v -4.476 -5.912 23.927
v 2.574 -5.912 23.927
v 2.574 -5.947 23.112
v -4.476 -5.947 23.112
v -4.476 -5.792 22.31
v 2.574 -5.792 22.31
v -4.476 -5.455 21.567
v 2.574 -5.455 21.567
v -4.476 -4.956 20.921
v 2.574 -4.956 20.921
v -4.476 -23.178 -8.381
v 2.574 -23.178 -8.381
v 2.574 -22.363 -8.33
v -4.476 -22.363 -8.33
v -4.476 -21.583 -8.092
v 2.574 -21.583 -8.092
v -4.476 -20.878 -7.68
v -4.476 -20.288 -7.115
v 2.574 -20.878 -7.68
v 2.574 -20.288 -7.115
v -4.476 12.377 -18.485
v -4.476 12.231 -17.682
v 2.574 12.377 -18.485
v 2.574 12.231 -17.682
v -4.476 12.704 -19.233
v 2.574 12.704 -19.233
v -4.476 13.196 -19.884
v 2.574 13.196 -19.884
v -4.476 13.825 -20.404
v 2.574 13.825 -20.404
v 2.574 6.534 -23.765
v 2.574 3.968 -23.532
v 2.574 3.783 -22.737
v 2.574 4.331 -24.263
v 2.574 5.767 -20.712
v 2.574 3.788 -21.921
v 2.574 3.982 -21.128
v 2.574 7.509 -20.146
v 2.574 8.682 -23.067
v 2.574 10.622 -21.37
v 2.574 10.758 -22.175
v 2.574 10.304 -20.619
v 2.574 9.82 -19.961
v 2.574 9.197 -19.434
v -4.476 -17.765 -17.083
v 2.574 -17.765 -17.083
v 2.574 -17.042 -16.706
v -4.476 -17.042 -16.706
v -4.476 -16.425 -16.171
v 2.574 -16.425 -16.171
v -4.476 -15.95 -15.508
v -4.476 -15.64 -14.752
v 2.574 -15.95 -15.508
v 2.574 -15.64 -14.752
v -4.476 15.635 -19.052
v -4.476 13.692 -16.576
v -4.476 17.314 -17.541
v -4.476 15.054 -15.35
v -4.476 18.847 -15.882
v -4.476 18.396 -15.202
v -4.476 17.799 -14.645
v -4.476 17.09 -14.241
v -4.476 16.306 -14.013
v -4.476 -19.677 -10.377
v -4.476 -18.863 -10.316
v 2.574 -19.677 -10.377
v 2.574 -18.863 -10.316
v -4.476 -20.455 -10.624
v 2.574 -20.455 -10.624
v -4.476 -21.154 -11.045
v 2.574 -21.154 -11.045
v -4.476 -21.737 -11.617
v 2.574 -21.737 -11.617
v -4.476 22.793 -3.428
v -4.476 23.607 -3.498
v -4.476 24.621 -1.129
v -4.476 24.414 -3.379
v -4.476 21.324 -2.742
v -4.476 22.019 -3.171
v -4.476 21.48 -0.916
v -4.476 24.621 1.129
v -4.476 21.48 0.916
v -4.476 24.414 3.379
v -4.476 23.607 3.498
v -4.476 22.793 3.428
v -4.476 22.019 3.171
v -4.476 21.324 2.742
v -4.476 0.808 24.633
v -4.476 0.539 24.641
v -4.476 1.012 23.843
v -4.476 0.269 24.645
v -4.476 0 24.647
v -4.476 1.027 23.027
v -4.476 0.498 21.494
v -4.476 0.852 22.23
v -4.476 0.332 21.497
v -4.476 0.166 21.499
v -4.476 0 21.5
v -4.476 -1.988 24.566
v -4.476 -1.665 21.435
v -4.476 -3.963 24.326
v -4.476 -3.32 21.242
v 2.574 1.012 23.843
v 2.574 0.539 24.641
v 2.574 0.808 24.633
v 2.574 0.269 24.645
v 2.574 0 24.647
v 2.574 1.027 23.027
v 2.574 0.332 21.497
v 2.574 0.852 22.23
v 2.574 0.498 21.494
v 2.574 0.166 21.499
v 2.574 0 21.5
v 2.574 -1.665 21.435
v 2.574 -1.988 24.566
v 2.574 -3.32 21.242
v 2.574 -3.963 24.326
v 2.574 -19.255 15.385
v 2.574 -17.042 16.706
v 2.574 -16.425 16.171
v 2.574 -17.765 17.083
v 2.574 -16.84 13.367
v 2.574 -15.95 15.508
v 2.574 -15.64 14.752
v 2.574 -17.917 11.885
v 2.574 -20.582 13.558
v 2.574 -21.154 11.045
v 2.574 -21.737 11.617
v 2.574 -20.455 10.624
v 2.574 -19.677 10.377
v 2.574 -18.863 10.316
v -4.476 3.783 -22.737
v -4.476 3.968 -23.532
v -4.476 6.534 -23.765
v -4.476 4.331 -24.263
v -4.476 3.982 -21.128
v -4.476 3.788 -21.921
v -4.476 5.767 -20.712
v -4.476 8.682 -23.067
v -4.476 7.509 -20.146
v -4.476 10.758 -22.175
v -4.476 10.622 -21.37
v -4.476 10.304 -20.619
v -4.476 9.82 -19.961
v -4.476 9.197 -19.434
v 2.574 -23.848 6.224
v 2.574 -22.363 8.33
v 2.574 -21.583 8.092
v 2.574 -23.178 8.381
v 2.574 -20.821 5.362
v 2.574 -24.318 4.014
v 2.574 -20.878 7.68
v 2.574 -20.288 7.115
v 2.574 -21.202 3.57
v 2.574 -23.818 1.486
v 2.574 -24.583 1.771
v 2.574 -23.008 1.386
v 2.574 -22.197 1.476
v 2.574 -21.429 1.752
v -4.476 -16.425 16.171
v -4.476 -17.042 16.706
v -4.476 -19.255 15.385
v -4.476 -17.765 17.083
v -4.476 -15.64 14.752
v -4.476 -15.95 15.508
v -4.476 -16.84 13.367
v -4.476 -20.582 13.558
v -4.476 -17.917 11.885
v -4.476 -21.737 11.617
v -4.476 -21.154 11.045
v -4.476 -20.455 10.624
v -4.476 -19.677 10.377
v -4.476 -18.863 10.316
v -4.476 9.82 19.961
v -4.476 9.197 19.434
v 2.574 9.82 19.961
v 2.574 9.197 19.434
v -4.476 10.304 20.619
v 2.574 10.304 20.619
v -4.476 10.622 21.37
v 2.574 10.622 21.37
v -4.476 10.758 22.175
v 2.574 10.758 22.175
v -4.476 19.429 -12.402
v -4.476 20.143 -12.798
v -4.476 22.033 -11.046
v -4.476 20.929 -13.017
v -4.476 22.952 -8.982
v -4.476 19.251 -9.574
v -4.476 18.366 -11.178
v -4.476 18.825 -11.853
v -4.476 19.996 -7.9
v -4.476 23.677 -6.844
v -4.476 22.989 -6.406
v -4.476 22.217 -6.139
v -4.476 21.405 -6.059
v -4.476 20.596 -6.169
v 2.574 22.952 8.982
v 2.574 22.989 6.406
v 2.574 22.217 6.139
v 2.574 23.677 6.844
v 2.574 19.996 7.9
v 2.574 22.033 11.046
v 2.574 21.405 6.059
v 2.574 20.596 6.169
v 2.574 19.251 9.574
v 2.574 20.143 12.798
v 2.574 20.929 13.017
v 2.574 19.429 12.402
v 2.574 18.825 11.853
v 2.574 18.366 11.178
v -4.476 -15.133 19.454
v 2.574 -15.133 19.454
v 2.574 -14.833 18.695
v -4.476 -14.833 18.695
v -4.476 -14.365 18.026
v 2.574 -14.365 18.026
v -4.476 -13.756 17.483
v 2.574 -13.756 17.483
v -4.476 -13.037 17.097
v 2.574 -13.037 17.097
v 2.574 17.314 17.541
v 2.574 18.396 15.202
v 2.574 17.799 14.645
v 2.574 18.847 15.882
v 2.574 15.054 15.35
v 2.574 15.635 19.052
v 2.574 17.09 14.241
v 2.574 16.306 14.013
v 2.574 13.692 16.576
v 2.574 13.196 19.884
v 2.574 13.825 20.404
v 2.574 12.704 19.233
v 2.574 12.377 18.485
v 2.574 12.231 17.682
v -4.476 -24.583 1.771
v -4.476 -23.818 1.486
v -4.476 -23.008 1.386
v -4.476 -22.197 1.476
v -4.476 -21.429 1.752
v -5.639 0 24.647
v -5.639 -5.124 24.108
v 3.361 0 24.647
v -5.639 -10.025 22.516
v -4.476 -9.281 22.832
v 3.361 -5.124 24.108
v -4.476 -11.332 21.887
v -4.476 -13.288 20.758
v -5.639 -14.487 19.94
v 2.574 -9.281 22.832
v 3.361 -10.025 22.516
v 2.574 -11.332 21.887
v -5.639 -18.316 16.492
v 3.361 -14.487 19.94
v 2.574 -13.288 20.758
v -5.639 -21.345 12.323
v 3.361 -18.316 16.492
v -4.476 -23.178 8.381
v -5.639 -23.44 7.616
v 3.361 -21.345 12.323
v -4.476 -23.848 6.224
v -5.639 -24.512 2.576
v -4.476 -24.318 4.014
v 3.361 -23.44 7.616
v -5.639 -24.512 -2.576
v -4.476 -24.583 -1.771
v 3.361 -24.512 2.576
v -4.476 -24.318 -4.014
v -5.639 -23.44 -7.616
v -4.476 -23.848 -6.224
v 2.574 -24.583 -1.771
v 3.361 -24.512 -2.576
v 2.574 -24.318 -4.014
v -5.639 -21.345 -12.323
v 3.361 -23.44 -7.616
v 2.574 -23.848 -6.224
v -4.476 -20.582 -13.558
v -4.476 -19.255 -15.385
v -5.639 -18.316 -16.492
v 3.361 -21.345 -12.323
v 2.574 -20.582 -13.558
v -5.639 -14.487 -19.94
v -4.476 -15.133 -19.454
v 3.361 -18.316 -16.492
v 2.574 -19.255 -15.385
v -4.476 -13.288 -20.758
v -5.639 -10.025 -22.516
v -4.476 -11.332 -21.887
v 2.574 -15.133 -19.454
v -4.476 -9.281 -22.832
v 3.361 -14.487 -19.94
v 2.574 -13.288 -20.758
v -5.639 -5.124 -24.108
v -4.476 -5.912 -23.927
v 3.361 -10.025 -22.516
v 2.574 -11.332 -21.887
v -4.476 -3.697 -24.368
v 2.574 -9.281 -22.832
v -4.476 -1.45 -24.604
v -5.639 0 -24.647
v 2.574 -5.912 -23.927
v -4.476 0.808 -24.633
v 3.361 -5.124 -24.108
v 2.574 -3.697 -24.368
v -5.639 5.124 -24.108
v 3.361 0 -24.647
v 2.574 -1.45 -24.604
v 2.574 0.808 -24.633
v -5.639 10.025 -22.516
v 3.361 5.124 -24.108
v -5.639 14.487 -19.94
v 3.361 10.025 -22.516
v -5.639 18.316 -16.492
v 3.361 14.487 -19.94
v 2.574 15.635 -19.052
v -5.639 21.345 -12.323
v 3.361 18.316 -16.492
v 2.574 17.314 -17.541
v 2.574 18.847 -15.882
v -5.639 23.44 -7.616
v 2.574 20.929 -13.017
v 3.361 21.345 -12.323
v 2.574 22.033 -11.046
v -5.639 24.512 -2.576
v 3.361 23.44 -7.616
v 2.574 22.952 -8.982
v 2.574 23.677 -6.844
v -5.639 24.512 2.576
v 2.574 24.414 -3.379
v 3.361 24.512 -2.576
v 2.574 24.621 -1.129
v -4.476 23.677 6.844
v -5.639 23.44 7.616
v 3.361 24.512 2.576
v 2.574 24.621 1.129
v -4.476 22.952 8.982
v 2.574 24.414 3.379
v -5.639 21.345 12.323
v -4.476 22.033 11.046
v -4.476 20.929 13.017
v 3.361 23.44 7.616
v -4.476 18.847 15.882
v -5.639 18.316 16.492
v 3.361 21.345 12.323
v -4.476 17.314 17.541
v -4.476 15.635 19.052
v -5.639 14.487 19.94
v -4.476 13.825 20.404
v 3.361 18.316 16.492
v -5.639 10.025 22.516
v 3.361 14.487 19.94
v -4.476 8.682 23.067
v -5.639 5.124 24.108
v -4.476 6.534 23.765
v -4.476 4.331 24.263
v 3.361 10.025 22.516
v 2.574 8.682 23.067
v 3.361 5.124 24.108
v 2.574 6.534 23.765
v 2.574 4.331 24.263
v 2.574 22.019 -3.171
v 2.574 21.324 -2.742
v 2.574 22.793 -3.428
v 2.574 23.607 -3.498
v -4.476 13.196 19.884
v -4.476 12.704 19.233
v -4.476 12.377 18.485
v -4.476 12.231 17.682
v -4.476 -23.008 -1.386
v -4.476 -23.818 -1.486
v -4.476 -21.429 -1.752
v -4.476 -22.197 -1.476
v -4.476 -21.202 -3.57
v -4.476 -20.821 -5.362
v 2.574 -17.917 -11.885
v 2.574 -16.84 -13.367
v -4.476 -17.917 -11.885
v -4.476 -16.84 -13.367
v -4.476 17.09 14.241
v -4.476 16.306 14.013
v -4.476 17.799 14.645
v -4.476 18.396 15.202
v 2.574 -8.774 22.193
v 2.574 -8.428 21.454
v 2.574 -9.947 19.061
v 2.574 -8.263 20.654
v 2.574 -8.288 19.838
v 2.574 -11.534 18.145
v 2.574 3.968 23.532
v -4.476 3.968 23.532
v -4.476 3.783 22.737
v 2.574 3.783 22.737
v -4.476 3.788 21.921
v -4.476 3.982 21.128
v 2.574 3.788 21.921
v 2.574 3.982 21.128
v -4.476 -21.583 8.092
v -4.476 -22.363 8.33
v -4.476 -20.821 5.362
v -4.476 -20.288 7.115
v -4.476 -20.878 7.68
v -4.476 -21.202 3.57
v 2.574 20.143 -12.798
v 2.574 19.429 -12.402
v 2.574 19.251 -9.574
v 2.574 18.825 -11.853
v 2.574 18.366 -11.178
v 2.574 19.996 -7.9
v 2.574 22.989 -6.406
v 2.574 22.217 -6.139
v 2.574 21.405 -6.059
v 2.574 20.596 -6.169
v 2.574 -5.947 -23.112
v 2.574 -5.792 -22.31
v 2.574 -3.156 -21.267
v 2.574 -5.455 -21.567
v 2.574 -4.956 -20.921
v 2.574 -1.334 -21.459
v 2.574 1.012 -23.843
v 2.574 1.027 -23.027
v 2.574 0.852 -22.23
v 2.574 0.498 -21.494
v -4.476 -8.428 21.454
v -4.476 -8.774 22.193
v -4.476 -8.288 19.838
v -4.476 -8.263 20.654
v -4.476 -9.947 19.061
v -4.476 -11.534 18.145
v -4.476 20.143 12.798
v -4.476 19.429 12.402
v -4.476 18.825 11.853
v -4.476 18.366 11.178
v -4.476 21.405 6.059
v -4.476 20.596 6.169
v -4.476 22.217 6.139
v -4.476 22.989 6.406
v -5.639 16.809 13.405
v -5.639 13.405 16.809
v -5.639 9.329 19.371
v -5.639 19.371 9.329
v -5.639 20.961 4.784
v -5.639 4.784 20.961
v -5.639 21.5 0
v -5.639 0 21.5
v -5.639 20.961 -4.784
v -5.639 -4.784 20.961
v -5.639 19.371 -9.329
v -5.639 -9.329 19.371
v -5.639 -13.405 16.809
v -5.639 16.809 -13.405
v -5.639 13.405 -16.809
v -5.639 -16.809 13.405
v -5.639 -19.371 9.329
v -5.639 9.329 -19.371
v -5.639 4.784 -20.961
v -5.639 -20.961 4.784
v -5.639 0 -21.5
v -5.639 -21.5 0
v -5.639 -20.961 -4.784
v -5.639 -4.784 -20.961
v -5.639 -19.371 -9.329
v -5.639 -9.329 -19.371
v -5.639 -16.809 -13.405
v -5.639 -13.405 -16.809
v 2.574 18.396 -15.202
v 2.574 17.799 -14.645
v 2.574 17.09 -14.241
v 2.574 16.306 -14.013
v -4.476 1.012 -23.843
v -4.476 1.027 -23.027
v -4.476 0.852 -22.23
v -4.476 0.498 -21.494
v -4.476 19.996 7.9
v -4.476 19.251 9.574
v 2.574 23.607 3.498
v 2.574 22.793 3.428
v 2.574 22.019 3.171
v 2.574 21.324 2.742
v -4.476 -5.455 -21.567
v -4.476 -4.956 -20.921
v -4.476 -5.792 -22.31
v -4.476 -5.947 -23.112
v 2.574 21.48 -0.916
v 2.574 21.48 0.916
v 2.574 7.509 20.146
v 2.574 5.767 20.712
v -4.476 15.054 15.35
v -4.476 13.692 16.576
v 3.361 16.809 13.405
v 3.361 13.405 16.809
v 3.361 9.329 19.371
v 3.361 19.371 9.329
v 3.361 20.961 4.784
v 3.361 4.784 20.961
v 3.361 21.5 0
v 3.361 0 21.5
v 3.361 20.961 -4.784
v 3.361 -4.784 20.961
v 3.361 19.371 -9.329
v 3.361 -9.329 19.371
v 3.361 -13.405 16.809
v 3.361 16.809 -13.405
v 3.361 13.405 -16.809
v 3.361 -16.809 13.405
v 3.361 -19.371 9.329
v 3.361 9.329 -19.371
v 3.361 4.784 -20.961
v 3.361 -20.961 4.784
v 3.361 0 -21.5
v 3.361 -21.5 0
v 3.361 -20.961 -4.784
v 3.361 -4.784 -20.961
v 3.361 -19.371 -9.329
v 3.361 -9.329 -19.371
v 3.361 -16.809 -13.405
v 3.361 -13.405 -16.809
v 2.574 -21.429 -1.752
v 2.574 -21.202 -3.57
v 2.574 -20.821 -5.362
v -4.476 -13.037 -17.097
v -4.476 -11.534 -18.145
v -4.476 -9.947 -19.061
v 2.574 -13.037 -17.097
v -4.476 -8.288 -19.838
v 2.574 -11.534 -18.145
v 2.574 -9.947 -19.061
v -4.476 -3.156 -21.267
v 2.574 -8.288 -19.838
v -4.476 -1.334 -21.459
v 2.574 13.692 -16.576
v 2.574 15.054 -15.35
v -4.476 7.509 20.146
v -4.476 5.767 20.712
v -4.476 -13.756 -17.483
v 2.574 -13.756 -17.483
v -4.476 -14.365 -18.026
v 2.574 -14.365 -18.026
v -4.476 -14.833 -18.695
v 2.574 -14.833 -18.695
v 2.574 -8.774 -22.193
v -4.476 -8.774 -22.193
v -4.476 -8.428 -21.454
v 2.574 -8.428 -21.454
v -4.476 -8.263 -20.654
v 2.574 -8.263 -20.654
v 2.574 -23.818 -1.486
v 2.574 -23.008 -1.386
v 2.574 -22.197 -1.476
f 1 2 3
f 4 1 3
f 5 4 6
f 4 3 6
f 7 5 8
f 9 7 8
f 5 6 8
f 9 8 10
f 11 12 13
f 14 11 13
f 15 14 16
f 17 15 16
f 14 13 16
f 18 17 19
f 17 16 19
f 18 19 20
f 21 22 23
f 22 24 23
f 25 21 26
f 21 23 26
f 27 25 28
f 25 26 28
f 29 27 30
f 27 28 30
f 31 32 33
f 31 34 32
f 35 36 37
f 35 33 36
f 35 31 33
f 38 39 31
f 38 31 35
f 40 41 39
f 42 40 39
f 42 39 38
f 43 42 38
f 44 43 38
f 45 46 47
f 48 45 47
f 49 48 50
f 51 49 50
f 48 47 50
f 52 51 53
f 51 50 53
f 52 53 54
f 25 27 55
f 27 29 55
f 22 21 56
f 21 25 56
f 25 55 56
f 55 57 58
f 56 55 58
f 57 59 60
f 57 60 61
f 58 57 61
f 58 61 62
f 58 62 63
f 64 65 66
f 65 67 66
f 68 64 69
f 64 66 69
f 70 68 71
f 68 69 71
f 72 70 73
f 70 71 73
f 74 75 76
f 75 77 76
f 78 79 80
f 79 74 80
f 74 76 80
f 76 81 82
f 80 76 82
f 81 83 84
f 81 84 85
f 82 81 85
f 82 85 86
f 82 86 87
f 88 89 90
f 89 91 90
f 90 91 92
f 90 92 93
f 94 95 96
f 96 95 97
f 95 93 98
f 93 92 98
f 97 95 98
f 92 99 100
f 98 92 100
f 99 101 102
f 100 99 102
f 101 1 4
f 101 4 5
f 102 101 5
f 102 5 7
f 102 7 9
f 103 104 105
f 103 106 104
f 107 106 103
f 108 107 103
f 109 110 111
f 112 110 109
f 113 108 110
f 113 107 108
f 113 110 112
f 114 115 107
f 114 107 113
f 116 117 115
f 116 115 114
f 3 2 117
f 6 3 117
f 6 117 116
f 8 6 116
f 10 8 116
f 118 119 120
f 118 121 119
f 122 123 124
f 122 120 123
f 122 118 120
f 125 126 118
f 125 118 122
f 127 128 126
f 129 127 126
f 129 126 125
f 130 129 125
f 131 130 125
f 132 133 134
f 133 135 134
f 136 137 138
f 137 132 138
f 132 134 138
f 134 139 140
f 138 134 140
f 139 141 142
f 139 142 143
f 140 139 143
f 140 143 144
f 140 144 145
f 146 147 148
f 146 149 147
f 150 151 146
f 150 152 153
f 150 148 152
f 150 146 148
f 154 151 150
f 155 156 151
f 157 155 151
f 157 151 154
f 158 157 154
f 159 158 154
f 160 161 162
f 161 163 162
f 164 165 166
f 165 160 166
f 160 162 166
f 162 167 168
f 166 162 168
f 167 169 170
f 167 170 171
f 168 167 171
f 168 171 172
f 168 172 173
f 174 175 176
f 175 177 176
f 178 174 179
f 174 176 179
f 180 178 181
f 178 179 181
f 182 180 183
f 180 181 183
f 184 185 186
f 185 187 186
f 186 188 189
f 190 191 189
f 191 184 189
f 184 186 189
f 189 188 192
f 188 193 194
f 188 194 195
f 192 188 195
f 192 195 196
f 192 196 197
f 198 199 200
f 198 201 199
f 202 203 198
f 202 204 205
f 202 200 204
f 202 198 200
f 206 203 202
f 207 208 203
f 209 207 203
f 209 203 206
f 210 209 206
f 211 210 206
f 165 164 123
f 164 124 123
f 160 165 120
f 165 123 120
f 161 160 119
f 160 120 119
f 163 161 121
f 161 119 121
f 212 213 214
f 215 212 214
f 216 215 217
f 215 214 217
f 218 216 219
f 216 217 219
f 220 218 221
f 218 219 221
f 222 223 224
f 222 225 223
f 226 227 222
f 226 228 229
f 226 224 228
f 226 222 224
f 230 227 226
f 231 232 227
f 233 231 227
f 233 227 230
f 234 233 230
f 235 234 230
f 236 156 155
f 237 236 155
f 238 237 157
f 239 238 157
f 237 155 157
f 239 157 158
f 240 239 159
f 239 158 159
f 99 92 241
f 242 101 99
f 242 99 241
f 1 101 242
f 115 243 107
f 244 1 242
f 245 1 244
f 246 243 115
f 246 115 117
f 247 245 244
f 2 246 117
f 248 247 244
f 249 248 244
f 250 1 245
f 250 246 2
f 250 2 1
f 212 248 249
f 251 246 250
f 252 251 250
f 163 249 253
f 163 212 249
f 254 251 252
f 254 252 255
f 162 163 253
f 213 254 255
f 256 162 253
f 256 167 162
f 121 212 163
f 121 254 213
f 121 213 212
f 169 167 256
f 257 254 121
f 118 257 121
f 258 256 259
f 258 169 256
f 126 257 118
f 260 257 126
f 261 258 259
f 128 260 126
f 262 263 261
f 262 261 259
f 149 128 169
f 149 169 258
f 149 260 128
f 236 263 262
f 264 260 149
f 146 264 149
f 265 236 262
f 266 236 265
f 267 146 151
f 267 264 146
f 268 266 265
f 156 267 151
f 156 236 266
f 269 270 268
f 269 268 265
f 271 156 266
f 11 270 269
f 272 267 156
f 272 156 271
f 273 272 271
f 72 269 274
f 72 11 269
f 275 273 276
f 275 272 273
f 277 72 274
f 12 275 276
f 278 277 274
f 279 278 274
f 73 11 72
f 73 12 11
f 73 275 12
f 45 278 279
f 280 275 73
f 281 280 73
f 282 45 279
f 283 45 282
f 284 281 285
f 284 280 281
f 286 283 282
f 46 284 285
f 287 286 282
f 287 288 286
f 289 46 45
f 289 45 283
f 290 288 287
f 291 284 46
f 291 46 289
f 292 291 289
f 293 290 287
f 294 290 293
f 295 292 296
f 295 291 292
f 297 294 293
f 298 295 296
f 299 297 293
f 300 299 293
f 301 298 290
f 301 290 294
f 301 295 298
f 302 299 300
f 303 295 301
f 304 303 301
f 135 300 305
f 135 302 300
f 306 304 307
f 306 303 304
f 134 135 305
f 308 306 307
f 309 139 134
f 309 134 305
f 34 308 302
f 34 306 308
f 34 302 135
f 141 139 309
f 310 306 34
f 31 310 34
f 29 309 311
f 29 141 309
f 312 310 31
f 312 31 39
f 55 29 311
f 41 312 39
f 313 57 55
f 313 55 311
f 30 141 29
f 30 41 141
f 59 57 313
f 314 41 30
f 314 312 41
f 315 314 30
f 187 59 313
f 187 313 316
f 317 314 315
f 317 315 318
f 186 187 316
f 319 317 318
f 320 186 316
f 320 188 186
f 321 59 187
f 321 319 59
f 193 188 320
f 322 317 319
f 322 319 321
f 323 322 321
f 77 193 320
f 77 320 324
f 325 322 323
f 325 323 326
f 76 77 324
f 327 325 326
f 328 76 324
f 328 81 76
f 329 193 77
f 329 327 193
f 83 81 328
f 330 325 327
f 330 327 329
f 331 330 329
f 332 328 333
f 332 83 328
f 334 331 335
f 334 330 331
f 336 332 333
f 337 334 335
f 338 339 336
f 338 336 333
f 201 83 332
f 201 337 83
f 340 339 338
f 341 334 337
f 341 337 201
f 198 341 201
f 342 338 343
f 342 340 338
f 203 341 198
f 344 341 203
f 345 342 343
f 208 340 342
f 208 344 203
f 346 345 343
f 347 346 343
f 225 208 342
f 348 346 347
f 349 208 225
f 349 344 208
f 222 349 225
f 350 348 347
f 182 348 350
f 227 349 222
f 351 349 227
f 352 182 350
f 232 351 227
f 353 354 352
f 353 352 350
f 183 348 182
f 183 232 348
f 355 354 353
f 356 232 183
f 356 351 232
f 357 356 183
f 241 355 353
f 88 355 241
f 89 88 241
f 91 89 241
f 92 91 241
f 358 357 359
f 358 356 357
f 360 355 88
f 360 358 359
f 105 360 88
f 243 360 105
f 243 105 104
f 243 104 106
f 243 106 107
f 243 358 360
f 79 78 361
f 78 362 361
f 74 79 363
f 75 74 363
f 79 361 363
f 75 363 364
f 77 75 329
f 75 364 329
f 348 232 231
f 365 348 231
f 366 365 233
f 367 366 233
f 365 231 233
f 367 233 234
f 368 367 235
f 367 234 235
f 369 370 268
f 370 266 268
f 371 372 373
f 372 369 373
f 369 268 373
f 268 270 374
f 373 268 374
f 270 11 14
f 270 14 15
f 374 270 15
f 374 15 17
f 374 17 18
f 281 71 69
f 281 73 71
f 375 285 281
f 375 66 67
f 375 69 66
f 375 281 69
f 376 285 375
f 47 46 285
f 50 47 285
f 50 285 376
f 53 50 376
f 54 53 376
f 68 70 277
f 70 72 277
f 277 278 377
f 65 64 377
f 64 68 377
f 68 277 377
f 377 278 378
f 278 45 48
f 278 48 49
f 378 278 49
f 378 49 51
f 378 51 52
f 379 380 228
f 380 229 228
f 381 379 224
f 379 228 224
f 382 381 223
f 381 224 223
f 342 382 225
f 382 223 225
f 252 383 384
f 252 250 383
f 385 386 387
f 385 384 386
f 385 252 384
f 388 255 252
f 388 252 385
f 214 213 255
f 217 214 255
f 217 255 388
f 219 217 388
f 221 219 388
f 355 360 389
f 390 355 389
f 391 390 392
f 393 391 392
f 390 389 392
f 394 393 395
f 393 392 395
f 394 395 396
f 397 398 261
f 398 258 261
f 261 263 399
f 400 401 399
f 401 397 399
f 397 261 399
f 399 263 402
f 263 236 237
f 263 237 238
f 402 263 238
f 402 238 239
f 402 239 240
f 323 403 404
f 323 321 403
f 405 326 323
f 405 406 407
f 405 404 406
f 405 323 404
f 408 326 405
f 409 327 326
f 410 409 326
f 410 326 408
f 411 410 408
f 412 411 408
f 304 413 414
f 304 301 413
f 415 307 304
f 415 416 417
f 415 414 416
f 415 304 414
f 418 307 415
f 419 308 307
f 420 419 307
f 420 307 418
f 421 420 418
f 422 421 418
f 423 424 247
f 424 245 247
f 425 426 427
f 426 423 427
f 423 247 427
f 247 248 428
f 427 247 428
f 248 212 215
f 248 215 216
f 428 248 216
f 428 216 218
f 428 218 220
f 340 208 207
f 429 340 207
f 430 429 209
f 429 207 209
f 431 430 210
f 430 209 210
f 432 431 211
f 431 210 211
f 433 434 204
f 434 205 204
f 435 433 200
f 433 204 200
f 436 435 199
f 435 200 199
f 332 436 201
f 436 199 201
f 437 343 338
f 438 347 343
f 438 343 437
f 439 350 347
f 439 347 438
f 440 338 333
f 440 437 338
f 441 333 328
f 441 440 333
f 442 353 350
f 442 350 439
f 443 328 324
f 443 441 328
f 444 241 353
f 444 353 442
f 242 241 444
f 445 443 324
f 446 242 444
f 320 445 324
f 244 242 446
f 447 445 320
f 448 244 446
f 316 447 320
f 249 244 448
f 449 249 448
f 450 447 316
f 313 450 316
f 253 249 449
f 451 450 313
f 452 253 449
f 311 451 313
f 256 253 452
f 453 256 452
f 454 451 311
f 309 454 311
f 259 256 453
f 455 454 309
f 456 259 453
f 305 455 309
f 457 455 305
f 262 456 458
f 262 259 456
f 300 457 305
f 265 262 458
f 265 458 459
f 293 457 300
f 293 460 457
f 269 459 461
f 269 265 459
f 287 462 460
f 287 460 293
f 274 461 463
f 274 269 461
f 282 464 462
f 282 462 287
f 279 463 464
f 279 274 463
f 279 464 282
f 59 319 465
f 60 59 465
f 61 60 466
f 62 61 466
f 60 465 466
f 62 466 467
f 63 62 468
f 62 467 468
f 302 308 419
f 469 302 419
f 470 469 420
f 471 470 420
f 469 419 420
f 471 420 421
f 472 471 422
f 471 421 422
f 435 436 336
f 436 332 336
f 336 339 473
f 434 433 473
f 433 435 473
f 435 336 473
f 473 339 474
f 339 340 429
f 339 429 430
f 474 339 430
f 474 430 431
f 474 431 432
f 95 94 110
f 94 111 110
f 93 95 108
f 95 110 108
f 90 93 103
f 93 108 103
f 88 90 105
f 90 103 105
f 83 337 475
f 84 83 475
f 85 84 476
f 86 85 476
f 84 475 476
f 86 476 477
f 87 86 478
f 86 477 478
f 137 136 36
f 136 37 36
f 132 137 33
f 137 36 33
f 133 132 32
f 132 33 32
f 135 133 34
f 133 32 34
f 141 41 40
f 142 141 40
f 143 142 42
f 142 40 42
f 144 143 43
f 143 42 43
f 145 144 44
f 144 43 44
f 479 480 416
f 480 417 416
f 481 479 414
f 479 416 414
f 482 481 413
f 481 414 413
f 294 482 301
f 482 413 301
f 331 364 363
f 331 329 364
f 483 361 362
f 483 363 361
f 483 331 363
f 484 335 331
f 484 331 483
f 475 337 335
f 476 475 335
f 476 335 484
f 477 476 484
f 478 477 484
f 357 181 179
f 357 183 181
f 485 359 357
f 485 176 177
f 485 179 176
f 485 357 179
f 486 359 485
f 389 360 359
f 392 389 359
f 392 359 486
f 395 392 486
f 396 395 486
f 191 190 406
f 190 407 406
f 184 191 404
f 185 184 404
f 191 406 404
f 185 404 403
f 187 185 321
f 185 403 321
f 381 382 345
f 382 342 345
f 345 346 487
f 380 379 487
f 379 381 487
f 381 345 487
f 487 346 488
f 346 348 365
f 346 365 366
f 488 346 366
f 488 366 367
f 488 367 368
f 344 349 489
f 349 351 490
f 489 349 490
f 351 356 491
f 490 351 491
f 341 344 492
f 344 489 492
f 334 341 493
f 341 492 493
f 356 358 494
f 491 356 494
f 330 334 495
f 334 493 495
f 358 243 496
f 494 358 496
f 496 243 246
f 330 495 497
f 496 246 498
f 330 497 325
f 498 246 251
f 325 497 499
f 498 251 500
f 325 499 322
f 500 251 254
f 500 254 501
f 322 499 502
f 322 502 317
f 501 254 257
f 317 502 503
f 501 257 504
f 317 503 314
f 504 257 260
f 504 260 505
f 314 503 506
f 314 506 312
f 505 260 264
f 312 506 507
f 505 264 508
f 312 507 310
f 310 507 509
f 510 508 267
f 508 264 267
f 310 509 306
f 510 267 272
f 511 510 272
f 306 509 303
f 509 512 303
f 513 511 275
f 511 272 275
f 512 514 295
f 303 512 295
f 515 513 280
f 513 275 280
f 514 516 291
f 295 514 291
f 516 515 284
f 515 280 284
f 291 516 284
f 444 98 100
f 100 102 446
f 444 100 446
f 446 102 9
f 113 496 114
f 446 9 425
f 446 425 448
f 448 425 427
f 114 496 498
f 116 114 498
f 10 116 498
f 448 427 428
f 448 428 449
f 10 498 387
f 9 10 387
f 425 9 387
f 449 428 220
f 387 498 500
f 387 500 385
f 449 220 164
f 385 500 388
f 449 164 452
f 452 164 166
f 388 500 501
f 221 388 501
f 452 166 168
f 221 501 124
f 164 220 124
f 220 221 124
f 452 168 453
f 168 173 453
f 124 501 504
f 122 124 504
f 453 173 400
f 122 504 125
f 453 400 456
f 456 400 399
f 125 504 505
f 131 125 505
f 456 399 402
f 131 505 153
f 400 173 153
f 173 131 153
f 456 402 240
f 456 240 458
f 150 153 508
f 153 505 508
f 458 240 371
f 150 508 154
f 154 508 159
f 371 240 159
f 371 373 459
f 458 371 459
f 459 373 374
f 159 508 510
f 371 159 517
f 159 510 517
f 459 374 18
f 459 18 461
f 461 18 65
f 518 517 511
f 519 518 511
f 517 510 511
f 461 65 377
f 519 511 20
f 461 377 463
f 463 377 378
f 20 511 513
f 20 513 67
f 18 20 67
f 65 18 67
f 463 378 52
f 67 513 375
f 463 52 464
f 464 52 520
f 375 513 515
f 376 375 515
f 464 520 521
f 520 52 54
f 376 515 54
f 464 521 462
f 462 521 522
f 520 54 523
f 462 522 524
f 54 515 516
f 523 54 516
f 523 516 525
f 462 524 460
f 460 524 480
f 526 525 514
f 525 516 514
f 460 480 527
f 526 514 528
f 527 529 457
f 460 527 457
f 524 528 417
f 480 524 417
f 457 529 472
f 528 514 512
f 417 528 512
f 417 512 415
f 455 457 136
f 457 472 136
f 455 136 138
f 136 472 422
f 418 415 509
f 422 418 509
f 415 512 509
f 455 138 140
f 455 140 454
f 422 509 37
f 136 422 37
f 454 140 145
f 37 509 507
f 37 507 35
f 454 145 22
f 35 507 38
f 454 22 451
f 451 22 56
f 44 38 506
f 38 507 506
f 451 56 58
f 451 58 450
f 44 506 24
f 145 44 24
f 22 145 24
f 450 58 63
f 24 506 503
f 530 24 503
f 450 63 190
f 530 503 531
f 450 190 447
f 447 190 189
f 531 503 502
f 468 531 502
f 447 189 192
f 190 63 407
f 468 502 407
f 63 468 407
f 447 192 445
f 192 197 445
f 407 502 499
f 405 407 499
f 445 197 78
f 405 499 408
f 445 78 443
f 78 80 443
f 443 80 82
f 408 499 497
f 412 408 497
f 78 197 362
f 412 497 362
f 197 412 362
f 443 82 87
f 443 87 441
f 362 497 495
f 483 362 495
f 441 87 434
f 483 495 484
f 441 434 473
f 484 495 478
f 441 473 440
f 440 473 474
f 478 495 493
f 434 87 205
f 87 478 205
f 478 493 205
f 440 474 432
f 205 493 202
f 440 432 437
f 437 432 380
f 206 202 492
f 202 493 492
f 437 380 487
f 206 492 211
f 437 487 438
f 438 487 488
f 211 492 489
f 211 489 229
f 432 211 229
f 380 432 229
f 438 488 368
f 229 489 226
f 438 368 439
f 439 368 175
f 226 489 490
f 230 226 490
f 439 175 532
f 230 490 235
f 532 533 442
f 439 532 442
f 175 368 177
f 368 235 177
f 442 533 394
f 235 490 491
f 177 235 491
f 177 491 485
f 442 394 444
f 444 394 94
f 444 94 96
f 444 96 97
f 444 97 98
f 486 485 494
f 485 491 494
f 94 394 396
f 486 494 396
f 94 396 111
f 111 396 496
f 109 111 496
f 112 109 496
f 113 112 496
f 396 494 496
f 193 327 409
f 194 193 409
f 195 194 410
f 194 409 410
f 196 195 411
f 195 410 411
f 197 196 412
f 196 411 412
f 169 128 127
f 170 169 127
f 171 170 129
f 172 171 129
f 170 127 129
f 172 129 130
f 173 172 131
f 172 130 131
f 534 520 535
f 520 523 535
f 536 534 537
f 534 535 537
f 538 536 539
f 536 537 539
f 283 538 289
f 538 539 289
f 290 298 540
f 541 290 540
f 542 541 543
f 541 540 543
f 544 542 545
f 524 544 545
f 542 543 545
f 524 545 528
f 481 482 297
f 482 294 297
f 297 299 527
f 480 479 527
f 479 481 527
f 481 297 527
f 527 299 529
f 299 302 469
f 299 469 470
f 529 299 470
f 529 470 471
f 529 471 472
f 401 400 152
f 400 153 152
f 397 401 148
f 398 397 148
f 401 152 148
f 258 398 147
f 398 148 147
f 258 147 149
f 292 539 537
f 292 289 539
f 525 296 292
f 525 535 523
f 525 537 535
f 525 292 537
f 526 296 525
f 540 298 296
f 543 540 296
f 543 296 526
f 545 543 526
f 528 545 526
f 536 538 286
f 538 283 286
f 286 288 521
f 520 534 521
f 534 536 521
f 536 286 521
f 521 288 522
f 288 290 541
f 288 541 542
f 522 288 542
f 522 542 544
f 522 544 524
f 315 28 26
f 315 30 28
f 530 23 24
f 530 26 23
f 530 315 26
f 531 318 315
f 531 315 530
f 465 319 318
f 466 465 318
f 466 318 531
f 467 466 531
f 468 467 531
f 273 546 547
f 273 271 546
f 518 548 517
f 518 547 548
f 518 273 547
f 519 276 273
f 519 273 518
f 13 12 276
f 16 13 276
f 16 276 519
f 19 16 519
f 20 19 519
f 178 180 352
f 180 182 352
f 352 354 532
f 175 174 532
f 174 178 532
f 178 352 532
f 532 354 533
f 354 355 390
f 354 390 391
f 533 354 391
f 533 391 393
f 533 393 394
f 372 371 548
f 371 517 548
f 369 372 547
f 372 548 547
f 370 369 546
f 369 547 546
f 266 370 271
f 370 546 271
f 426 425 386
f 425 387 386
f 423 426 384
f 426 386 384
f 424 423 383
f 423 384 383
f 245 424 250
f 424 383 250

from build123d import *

# Parameters (mm, degrees)
ESQUISSE1_W                  = 9
ESQUISSE1_H                  = 3.146636507
ESQUISSE2_W                  = 7.05
ESQUISSE2_H                  = 3.5
R_P_TITION_CIRCULAIRE1_COUNT = 15


with BuildPart() as part:
    # Esquisse1 → Base-Révolution (revolve)
    with BuildSketch(Plane.XY, mode=Mode.PRIVATE) as base_r_volution_sk:
        with Locations((-1.139387669, 23.073318253)):
            Rectangle(ESQUISSE1_W, ESQUISSE1_H)
    revolve(base_r_volution_sk.sketch.rotate(Axis((-8.771095324, 0, 0), (1, 0, 0)), 90), axis=Axis((-8.771095324, 0, 0), (1, 0, 0)))

    # Esquisse2 → Enlèvement de matière-Révolution1 (revolve, cut)
    with BuildSketch(Plane.XY):
        with Locations((-0.951181968, 25.25)):
            Rectangle(ESQUISSE2_W, ESQUISSE2_H)
    enl_vement_de_mati_re_r_volution1 = revolve(axis=Axis((-7.697366985, 23.5, 0), (1, 0, 0)), mode=Mode.SUBTRACT)

    # Répétition circulaire1: Enlèvement de matière-Révolution1 ×15 about axis
    r_p_tition_circulaire1_axis = Axis((0, 0, 0), (1, 0, 0))
    for i in range(1, R_P_TITION_CIRCULAIRE1_COUNT):
        add(enl_vement_de_mati_re_r_volution1.rotate(r_p_tition_circulaire1_axis, i * 360 / R_P_TITION_CIRCULAIRE1_COUNT), mode=Mode.SUBTRACT)


solid = part.part
